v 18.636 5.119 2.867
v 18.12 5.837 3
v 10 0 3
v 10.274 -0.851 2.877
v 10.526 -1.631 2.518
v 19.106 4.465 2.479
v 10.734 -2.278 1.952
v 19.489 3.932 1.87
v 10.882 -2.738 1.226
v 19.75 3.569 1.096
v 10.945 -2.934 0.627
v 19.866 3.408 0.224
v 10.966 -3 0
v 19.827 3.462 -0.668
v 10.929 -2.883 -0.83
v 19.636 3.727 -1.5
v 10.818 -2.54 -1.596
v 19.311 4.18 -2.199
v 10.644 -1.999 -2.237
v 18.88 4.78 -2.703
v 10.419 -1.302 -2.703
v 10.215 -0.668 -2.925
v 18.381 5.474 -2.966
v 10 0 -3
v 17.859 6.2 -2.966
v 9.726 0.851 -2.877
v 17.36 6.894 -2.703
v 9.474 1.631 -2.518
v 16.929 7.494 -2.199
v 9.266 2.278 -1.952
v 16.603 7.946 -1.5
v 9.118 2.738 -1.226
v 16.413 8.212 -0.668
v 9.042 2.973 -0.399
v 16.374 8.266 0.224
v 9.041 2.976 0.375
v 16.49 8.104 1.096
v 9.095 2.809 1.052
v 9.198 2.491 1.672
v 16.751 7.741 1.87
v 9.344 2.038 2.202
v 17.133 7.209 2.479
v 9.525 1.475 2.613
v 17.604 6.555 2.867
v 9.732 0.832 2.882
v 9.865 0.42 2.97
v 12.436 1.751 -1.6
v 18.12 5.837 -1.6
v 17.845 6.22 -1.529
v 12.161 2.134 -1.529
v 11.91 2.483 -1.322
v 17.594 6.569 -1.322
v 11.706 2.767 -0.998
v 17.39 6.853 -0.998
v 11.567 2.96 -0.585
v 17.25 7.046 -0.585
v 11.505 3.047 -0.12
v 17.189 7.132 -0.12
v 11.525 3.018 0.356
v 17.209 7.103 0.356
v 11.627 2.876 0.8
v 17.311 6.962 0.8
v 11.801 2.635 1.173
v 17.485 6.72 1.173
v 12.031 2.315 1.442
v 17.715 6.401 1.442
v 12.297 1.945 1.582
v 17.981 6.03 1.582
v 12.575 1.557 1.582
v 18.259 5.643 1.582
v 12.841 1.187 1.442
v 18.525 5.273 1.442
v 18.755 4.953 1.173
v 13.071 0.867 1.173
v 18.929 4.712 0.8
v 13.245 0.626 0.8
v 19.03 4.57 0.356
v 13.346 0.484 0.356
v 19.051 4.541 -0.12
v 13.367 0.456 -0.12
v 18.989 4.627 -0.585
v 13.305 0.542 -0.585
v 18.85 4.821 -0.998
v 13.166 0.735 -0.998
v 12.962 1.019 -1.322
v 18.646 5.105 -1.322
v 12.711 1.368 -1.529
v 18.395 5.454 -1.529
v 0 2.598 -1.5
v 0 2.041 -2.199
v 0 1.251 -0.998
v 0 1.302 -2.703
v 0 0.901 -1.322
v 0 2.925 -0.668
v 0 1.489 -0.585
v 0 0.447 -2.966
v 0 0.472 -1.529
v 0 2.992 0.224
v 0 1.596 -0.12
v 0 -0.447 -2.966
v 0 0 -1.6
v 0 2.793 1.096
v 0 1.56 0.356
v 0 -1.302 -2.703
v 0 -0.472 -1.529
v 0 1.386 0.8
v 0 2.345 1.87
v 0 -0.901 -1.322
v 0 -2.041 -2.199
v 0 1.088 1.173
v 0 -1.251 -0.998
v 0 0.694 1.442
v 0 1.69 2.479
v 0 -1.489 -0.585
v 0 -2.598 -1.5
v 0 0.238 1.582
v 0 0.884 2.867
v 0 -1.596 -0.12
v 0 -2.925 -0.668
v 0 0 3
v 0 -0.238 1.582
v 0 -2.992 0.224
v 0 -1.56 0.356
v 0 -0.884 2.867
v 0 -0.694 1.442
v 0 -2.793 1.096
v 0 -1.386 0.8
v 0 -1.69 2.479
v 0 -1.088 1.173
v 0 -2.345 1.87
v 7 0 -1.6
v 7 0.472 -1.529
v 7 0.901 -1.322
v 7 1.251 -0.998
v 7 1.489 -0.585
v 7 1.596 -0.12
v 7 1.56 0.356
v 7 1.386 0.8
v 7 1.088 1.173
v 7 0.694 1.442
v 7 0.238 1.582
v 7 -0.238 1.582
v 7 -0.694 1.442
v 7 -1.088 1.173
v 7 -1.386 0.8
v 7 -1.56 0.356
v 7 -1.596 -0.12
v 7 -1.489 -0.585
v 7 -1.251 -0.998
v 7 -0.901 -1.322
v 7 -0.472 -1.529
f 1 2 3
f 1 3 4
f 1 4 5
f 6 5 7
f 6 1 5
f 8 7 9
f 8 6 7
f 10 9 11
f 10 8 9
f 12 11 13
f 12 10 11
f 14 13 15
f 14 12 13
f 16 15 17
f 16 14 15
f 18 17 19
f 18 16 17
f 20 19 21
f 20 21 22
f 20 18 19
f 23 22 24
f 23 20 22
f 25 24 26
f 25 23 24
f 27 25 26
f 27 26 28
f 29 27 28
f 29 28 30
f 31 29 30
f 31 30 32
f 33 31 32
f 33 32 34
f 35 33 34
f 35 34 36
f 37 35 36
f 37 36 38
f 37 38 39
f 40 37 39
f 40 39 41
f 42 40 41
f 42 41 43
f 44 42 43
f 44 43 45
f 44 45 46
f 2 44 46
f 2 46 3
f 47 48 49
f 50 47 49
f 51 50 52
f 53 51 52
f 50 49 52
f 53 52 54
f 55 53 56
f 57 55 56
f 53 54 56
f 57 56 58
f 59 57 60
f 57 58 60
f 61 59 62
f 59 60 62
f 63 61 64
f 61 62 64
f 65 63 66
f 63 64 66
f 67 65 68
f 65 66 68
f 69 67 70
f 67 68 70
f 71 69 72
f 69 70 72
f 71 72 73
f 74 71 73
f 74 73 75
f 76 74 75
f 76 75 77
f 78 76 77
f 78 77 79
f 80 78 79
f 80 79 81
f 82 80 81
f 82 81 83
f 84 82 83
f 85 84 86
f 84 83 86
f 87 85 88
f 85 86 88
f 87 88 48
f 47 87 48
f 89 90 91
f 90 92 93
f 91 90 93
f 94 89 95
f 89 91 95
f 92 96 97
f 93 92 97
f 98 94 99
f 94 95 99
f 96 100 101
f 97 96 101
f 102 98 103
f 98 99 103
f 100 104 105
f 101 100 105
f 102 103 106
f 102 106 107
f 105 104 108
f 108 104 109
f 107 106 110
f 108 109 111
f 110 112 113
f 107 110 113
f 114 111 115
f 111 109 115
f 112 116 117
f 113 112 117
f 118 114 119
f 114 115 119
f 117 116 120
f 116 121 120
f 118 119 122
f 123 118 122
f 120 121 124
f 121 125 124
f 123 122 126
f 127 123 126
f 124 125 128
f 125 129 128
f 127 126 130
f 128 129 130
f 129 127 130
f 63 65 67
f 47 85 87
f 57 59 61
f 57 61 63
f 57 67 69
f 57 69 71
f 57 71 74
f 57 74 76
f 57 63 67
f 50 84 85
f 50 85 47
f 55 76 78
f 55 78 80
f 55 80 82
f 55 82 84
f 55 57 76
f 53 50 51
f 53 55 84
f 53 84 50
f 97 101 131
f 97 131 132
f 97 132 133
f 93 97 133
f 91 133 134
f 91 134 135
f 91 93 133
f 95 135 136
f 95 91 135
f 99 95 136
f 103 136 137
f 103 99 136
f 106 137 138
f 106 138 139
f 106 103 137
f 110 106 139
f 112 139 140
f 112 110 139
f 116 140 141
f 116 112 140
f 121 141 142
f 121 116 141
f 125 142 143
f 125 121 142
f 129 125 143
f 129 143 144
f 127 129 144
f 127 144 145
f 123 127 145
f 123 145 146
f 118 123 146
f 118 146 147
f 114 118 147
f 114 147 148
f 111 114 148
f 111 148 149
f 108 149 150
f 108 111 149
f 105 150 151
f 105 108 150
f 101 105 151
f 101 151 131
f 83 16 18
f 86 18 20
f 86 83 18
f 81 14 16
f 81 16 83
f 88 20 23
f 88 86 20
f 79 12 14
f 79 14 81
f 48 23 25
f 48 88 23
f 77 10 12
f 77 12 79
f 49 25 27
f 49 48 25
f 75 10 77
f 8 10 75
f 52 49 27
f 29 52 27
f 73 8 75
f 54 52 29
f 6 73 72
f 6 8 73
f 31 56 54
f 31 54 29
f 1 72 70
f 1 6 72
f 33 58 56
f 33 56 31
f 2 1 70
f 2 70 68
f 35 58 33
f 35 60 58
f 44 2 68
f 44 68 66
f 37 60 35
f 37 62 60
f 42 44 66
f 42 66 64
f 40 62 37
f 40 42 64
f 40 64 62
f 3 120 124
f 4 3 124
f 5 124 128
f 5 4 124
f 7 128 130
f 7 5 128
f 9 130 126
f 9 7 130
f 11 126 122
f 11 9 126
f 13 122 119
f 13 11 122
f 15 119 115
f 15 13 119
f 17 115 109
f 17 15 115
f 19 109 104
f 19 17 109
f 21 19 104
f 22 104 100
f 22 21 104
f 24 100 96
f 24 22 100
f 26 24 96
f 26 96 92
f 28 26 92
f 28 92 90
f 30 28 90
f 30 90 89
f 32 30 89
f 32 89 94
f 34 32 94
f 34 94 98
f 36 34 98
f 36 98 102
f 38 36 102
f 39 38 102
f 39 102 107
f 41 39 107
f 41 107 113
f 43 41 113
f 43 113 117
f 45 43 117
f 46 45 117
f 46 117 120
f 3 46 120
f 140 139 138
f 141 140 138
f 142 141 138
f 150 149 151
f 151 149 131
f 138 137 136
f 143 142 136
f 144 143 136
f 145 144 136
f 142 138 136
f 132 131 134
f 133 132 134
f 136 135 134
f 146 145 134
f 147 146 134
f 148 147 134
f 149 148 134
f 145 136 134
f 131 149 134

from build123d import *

# Parameters (mm, degrees)
SWEEP1_PROFILE_R   = 3
SKETCH3_R          = 1.6
CUT_EXTRUDE1_DEPTH = 7


with BuildPart() as part:
    # Sweep1: sweep along a path in Sketch2
    with BuildLine(Plane.XY) as sweep1_path:
        Line((0, 0), (10, 0))
        Line((10, 0), (18.119816674, 5.836829378))
    # Sweep1 profile (on start of the path) → Sweep1 (sweep)
    with BuildSketch(Plane(origin=(0, 0, 0), x_dir=(0, 0, 1), z_dir=(1, 0, 0))):
        Circle(SWEEP1_PROFILE_R)
    sweep(path=sweep1_path.line, transition=Transition.RIGHT)

    # Sketch3 → Cut-Extrude1 (cut)
    with BuildSketch(Plane(origin=(0, 0, 0), x_dir=(0, 0, -1), z_dir=(1, 0, 0))):
        Circle(SKETCH3_R)
    cut_extrude1 = extrude(amount=CUT_EXTRUDE1_DEPTH, mode=Mode.SUBTRACT)

    # Mirror1: Cut-Extrude1 across plane
    add(cut_extrude1.mirror(Plane(origin=(9.059908337, 2.918414689, 0), x_dir=(0, 0, 1), z_dir=(0.951835508, 0.306609143, 0))), mode=Mode.SUBTRACT)


solid = part.part
